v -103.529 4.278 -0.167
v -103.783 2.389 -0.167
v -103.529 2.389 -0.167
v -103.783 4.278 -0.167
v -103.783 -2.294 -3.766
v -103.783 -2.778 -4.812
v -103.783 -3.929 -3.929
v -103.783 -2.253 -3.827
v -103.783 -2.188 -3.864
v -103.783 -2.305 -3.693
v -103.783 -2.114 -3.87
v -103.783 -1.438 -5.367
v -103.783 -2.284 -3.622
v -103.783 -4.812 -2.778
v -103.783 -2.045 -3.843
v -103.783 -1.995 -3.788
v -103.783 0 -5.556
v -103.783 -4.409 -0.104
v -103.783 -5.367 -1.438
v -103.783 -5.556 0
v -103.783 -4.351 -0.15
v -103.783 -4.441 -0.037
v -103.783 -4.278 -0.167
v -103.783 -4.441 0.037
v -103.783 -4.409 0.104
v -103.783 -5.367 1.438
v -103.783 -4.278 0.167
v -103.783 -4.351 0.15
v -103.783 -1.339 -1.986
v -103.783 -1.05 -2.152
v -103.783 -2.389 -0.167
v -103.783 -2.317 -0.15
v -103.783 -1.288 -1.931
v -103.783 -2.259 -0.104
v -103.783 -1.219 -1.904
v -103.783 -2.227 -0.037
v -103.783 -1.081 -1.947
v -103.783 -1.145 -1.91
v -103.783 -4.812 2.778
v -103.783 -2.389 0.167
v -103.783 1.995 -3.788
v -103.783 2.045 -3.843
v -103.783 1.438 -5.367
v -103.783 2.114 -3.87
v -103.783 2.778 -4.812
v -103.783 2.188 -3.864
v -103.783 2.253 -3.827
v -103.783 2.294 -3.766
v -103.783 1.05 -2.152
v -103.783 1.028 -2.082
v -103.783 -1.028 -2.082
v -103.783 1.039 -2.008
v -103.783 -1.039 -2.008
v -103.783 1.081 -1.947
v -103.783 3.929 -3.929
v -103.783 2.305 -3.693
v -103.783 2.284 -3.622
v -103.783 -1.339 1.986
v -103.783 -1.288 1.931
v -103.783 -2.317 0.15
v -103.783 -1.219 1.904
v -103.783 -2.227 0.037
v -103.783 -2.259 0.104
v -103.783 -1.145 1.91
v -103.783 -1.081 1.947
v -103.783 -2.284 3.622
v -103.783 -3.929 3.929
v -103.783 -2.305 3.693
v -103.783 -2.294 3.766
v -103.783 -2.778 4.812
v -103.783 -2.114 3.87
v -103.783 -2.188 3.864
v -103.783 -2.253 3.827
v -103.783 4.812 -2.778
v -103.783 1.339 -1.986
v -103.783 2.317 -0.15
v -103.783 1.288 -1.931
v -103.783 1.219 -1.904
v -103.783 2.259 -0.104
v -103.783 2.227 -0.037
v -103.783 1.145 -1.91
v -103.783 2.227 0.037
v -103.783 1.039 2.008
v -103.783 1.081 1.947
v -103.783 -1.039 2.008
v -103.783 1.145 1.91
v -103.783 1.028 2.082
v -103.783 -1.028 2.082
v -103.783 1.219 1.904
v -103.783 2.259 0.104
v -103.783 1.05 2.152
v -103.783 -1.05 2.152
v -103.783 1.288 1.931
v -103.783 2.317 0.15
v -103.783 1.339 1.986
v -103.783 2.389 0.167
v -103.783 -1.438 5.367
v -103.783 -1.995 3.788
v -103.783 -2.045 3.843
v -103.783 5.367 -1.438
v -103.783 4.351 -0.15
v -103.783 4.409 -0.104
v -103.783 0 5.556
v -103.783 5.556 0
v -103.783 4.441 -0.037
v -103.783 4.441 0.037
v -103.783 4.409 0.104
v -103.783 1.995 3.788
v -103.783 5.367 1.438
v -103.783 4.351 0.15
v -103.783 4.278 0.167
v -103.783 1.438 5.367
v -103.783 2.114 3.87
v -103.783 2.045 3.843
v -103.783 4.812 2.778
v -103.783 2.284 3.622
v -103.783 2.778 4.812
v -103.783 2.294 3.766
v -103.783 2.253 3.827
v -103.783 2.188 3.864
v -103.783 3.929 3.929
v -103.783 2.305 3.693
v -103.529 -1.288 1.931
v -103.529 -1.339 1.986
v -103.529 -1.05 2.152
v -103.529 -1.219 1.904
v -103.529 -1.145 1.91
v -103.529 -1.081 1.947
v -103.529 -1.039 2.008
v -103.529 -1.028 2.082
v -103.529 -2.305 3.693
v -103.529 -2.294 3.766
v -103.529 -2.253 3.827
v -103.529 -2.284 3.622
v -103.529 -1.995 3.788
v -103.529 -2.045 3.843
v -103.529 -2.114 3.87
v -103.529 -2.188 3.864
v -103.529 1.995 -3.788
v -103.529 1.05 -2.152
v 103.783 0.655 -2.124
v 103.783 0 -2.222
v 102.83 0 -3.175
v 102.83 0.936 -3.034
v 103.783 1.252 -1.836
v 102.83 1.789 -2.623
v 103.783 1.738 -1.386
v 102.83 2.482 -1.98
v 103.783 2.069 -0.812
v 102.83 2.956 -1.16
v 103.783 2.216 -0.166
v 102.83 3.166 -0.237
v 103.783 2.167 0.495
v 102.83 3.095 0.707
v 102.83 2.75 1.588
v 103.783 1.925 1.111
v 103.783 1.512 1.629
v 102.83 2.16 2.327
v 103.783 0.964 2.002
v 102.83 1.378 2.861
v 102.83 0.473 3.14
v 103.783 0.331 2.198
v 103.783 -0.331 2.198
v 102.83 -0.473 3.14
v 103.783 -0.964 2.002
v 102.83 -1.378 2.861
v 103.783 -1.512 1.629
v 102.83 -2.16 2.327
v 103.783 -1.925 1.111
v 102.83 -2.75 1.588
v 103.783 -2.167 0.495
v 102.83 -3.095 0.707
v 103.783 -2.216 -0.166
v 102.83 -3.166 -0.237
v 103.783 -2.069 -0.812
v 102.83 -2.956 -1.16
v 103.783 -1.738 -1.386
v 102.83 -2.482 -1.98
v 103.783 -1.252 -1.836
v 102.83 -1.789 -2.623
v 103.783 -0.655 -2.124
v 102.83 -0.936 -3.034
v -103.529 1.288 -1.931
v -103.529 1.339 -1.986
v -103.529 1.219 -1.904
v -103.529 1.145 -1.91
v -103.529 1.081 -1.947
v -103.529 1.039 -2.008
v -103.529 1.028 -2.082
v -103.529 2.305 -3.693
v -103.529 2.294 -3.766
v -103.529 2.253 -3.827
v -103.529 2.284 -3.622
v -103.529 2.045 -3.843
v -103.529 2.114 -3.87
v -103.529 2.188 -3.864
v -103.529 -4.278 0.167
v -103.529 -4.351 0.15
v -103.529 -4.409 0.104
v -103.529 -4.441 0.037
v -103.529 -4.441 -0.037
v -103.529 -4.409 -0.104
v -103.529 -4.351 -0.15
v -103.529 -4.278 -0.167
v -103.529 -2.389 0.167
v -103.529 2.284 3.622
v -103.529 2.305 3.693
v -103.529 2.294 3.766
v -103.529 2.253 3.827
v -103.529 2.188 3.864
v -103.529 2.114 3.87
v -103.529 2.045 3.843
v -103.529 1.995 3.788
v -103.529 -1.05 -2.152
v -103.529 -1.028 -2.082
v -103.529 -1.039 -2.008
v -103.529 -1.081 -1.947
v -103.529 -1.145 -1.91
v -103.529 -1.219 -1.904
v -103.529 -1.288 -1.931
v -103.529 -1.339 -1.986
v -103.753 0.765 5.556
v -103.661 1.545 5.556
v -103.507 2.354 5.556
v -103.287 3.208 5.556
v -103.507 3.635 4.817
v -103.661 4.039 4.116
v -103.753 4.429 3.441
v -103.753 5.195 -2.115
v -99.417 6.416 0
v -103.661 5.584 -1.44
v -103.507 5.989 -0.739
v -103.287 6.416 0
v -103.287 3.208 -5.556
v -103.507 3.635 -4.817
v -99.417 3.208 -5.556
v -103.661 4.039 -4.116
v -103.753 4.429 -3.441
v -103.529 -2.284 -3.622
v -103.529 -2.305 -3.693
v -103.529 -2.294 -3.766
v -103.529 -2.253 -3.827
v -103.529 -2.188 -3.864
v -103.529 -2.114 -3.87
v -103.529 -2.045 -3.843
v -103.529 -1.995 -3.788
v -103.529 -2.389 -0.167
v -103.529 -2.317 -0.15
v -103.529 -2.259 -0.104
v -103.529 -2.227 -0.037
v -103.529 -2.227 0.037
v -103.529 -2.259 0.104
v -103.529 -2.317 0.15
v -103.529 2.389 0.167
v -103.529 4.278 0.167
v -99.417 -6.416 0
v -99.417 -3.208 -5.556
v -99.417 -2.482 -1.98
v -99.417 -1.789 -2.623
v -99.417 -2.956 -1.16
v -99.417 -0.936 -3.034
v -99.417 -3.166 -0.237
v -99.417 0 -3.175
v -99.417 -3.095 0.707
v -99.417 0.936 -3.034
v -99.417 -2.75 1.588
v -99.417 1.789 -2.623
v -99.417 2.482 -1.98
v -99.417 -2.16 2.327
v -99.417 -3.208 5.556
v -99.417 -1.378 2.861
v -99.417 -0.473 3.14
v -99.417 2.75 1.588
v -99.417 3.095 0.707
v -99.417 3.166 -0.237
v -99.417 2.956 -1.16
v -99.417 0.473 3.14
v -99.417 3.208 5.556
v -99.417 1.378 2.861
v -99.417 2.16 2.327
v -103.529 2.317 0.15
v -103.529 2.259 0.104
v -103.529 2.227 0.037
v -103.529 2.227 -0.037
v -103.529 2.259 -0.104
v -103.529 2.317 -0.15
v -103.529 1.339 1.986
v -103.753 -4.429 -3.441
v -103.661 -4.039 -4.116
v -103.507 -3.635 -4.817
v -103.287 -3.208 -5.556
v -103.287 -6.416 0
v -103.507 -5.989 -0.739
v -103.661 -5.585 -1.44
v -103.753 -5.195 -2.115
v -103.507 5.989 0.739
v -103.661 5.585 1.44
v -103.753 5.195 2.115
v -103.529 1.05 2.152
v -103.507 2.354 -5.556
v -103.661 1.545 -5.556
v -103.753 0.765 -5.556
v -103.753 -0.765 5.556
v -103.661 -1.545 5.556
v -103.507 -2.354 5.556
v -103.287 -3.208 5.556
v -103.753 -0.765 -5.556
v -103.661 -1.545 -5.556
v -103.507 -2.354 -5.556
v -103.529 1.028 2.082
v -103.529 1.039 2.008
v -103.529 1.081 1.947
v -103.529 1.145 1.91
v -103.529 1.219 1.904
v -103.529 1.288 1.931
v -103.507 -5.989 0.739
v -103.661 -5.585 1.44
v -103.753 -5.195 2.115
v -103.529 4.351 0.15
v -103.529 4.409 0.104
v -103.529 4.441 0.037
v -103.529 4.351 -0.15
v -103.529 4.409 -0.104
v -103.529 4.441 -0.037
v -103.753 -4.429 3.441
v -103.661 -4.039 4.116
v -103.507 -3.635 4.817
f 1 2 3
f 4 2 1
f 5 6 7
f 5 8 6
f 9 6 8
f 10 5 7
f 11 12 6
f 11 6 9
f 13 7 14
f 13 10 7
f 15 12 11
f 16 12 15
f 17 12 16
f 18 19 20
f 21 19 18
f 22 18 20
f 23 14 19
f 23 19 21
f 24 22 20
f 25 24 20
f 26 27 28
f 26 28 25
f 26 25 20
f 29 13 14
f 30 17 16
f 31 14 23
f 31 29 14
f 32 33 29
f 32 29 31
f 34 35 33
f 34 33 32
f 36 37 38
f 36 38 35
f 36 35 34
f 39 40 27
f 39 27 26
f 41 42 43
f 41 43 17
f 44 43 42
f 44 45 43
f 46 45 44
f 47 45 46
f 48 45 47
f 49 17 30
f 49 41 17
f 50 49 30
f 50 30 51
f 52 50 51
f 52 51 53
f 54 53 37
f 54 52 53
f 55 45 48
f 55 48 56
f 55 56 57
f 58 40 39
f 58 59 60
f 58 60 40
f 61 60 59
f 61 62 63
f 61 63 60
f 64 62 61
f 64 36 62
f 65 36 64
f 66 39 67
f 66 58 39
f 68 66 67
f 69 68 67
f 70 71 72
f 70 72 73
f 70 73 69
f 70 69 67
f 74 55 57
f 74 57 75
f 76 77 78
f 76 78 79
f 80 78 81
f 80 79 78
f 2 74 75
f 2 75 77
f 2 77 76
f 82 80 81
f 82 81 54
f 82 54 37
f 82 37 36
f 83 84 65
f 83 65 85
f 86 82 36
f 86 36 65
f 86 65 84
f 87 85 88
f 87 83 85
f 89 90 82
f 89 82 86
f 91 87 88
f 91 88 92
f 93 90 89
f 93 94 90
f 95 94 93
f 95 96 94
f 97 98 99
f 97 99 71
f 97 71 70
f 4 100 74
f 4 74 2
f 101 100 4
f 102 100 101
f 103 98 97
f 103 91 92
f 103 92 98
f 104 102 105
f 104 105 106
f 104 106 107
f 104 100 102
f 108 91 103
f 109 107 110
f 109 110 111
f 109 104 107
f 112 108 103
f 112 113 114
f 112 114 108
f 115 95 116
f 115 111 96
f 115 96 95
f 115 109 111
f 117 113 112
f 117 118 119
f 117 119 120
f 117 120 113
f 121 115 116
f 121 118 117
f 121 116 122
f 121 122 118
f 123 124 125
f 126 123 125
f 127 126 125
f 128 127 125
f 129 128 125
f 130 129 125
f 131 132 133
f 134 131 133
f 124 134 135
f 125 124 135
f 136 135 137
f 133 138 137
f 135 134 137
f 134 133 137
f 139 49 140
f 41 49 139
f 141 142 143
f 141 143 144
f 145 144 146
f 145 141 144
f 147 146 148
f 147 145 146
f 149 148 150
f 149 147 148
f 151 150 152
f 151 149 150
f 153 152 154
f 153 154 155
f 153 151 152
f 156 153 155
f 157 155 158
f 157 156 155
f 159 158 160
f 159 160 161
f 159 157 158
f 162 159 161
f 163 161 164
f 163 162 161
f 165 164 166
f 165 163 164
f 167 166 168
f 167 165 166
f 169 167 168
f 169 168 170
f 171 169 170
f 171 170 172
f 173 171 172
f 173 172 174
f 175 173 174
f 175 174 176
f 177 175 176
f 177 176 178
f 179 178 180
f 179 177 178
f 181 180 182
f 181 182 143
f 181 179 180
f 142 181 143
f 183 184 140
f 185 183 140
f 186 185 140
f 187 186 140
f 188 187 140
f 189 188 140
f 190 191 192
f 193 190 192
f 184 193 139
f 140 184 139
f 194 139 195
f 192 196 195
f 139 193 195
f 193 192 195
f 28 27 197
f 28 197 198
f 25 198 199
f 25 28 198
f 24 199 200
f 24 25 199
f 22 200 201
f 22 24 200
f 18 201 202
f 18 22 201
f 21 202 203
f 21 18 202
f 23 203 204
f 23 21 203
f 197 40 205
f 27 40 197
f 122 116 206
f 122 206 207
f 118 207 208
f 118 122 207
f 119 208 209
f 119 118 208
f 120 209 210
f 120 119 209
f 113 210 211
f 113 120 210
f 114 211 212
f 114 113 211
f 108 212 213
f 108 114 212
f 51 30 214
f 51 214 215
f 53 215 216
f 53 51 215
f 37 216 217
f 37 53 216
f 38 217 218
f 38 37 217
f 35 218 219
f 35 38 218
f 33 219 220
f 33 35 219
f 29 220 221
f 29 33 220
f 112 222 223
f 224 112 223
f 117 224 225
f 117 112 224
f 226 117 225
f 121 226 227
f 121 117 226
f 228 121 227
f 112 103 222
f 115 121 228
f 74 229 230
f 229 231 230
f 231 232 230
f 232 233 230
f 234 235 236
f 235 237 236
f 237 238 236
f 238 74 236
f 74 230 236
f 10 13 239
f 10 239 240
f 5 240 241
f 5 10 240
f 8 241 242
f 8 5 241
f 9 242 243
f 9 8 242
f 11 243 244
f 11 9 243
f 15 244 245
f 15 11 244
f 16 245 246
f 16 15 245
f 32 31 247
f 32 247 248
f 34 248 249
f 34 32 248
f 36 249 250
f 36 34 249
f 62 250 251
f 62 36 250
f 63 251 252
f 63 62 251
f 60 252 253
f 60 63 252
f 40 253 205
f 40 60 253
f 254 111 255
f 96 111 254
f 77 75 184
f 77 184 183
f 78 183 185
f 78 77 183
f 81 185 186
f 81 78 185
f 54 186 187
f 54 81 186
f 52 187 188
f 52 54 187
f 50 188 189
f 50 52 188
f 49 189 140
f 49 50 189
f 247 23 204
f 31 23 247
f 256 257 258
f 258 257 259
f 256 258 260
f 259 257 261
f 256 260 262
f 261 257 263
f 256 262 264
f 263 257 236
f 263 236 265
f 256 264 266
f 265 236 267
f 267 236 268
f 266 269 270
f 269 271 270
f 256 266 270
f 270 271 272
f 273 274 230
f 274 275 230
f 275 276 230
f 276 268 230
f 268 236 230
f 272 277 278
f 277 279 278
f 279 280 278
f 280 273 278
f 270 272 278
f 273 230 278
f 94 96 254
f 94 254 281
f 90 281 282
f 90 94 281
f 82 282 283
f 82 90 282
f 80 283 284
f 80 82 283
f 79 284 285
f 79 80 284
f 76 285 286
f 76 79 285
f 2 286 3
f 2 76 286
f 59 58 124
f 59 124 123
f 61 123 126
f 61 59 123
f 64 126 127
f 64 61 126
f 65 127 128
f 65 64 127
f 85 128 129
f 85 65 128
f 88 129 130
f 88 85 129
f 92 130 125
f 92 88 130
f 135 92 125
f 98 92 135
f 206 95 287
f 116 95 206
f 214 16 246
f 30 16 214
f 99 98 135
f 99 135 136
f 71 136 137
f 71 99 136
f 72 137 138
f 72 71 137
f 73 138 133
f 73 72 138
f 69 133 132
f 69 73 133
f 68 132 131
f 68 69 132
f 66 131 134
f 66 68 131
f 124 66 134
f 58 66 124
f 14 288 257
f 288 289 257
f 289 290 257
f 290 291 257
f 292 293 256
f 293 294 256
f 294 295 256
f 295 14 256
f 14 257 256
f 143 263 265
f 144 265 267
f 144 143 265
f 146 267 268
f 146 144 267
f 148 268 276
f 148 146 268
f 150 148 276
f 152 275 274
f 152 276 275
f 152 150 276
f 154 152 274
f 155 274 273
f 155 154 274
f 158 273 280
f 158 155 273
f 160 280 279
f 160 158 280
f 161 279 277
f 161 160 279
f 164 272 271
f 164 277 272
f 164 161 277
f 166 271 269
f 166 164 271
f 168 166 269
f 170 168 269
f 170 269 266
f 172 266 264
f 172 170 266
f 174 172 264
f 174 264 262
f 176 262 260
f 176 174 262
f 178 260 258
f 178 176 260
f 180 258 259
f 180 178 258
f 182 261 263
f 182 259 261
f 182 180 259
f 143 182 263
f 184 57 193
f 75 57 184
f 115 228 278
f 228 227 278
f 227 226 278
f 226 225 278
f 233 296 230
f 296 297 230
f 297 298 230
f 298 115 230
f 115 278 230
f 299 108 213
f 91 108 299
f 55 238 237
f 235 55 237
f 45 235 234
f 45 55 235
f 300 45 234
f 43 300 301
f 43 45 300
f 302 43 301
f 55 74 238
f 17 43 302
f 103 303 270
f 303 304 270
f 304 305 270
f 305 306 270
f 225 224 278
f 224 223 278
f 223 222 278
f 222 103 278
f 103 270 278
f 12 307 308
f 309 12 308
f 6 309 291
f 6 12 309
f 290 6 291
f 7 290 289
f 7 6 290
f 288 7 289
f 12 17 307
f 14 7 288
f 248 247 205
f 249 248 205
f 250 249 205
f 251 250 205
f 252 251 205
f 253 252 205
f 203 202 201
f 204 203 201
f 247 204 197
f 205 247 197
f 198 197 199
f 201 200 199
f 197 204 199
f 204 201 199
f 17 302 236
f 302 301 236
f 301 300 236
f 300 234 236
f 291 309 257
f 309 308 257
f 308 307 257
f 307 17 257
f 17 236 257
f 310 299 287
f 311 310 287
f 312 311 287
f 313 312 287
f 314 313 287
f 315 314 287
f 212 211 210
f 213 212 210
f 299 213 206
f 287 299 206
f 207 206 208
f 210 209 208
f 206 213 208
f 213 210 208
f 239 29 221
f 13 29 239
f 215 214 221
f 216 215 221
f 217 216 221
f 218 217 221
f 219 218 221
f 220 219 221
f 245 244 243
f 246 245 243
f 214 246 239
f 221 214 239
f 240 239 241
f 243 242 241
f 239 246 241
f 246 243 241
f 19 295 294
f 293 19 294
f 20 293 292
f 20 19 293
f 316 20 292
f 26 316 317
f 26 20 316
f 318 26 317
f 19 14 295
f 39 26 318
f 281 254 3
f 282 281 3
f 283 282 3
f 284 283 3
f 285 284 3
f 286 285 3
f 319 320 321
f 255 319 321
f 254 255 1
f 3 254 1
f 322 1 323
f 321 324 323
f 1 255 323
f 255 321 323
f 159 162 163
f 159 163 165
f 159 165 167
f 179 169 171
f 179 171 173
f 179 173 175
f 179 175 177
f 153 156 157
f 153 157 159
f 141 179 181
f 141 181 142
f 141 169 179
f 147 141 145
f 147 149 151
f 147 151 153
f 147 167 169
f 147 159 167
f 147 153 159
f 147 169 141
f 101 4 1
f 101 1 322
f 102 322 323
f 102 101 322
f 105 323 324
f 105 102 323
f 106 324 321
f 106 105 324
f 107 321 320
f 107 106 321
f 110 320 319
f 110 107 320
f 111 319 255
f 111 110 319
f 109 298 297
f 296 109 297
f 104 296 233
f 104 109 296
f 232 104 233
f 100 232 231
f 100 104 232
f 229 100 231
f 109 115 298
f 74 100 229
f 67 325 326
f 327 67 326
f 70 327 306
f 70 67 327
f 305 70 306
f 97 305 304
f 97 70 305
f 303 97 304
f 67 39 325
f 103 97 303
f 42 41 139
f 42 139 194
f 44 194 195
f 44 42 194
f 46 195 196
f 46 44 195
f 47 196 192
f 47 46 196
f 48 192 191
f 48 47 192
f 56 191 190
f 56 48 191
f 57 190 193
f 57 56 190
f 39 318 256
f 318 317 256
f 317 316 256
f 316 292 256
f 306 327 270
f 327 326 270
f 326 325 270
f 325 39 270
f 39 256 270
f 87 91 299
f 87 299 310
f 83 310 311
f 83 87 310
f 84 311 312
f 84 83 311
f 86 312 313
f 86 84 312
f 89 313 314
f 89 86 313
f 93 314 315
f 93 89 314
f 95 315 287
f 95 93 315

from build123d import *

# Parameters (mm, degrees)
SKETCH5_R           = 3.175
BOSS_EXTRUDE3_DEPTH = 203.2
CHAMFER1_SIZE       = 0.9525
BOSS_EXTRUDE4_DEPTH = 4.365625
SKETCH8_OUTSIDE_W   = 777.858
SKETCH8_OUTSIDE_H   = 779.578
SKETCH8_OUTSIDE_R   = 5.55625
CUT_EXTRUDE3_DEPTH  = 208.739074677
CUT_EXTRUDE3_DRAFT  = -60
CUT_EXTRUDE4_DEPTH  = 0.254
CIRPATTERN1_COUNT   = 6


with BuildPart() as part:
    # Sketch5 → Boss-Extrude3 (new body)
    with BuildSketch(Plane(origin=(103.7828125, 0, 0), x_dir=(0, 0, -1), z_dir=(1, 0, 0))):
        Circle(SKETCH5_R)
    extrude(amount=-BOSS_EXTRUDE3_DEPTH)

    # Chamfer1
    chamfer1_edges = [part.edges().sort_by_distance(p)[0] for p in [
        (103.7828125, 0, 3.175),
    ]]
    chamfer(chamfer1_edges, length=CHAMFER1_SIZE)

    # Sketch11 → Revolve1 (revolve)
    with BuildSketch(Plane.XY):
        Polygon((-99.4171875, 3.175), (-99.4171875, 0), (81.5578125, 0), (78.3828125, 3.175), align=None)
    revolve(axis=Axis((-99.4171875, 0, 0), (1, 0, 0)))

    # Sketch6 → Boss-Extrude4 (add)
    with BuildSketch(Plane.ZY.offset(99.4171875)):
        Polygon((5.55625, 3.207902433), (0, 6.415804866), (-5.55625, 3.207902433), (-5.55625, -3.207902433), (0, -6.415804866), (5.55625, -3.207902433), align=None)
    extrude(amount=BOSS_EXTRUDE4_DEPTH)


with BuildPart() as cut_extrude3_tool:
    # Sketch8 outside → Cut-Extrude3 (with draft: the straight prism first)
    with BuildSketch(Plane.ZY.offset(103.7828125)):
        Rectangle(SKETCH8_OUTSIDE_W, SKETCH8_OUTSIDE_H)
        Circle(SKETCH8_OUTSIDE_R, mode=Mode.SUBTRACT)
    extrude(amount=-CUT_EXTRUDE3_DEPTH)
    # Cut-Extrude3: the draft: its side faces are tilted about the plane it starts from
    cut_extrude3_sides = [cut_extrude3_tool.faces().sort_by_distance(p)[0] for p in [
        (0.586724839, -389.789, 0),
        (0.586724839, 0, 388.929),
        (0.586724839, 389.789, 0),
        (0.586724839, 0, -388.929),
        (0.586724839, 0, -5.55625),
    ]]
    draft(cut_extrude3_sides, Plane.ZY.offset(103.7828125), CUT_EXTRUDE3_DRAFT)


with BuildPart() as part_1:
    add(part.part)

    # Cut-Extrude3: cut by cut_extrude3_tool
    add(cut_extrude3_tool.part, mode=Mode.SUBTRACT)

    # Sketch12 → Cut-Extrude4 (cut)
    with BuildSketch(Plane.ZY.offset(103.7828125)):
        with BuildLine():
            Line((0.1666875, 4.2783125), (0.1666875, 2.3891875))
            ThreePointArc((0.1666875, 2.3891875), (0, 2.2225), (-0.1666875, 2.3891875))
            Line((-0.1666875, 2.3891875), (-0.1666875, 4.2783125))
            ThreePointArc((-0.1666875, 4.2783125), (0, 4.445), (0.1666875, 4.2783125))
        make_face()
    cut_extrude4 = extrude(amount=-CUT_EXTRUDE4_DEPTH, mode=Mode.SUBTRACT)

    # CirPattern1: Cut-Extrude4 ×6 about axis
    cirpattern1_axis = Axis((0, 0, 0), (1, 0, 0))
    for i in range(1, CIRPATTERN1_COUNT):
        add(cut_extrude4.rotate(cirpattern1_axis, i * 360 / CIRPATTERN1_COUNT), mode=Mode.SUBTRACT)


solid = part_1.part
